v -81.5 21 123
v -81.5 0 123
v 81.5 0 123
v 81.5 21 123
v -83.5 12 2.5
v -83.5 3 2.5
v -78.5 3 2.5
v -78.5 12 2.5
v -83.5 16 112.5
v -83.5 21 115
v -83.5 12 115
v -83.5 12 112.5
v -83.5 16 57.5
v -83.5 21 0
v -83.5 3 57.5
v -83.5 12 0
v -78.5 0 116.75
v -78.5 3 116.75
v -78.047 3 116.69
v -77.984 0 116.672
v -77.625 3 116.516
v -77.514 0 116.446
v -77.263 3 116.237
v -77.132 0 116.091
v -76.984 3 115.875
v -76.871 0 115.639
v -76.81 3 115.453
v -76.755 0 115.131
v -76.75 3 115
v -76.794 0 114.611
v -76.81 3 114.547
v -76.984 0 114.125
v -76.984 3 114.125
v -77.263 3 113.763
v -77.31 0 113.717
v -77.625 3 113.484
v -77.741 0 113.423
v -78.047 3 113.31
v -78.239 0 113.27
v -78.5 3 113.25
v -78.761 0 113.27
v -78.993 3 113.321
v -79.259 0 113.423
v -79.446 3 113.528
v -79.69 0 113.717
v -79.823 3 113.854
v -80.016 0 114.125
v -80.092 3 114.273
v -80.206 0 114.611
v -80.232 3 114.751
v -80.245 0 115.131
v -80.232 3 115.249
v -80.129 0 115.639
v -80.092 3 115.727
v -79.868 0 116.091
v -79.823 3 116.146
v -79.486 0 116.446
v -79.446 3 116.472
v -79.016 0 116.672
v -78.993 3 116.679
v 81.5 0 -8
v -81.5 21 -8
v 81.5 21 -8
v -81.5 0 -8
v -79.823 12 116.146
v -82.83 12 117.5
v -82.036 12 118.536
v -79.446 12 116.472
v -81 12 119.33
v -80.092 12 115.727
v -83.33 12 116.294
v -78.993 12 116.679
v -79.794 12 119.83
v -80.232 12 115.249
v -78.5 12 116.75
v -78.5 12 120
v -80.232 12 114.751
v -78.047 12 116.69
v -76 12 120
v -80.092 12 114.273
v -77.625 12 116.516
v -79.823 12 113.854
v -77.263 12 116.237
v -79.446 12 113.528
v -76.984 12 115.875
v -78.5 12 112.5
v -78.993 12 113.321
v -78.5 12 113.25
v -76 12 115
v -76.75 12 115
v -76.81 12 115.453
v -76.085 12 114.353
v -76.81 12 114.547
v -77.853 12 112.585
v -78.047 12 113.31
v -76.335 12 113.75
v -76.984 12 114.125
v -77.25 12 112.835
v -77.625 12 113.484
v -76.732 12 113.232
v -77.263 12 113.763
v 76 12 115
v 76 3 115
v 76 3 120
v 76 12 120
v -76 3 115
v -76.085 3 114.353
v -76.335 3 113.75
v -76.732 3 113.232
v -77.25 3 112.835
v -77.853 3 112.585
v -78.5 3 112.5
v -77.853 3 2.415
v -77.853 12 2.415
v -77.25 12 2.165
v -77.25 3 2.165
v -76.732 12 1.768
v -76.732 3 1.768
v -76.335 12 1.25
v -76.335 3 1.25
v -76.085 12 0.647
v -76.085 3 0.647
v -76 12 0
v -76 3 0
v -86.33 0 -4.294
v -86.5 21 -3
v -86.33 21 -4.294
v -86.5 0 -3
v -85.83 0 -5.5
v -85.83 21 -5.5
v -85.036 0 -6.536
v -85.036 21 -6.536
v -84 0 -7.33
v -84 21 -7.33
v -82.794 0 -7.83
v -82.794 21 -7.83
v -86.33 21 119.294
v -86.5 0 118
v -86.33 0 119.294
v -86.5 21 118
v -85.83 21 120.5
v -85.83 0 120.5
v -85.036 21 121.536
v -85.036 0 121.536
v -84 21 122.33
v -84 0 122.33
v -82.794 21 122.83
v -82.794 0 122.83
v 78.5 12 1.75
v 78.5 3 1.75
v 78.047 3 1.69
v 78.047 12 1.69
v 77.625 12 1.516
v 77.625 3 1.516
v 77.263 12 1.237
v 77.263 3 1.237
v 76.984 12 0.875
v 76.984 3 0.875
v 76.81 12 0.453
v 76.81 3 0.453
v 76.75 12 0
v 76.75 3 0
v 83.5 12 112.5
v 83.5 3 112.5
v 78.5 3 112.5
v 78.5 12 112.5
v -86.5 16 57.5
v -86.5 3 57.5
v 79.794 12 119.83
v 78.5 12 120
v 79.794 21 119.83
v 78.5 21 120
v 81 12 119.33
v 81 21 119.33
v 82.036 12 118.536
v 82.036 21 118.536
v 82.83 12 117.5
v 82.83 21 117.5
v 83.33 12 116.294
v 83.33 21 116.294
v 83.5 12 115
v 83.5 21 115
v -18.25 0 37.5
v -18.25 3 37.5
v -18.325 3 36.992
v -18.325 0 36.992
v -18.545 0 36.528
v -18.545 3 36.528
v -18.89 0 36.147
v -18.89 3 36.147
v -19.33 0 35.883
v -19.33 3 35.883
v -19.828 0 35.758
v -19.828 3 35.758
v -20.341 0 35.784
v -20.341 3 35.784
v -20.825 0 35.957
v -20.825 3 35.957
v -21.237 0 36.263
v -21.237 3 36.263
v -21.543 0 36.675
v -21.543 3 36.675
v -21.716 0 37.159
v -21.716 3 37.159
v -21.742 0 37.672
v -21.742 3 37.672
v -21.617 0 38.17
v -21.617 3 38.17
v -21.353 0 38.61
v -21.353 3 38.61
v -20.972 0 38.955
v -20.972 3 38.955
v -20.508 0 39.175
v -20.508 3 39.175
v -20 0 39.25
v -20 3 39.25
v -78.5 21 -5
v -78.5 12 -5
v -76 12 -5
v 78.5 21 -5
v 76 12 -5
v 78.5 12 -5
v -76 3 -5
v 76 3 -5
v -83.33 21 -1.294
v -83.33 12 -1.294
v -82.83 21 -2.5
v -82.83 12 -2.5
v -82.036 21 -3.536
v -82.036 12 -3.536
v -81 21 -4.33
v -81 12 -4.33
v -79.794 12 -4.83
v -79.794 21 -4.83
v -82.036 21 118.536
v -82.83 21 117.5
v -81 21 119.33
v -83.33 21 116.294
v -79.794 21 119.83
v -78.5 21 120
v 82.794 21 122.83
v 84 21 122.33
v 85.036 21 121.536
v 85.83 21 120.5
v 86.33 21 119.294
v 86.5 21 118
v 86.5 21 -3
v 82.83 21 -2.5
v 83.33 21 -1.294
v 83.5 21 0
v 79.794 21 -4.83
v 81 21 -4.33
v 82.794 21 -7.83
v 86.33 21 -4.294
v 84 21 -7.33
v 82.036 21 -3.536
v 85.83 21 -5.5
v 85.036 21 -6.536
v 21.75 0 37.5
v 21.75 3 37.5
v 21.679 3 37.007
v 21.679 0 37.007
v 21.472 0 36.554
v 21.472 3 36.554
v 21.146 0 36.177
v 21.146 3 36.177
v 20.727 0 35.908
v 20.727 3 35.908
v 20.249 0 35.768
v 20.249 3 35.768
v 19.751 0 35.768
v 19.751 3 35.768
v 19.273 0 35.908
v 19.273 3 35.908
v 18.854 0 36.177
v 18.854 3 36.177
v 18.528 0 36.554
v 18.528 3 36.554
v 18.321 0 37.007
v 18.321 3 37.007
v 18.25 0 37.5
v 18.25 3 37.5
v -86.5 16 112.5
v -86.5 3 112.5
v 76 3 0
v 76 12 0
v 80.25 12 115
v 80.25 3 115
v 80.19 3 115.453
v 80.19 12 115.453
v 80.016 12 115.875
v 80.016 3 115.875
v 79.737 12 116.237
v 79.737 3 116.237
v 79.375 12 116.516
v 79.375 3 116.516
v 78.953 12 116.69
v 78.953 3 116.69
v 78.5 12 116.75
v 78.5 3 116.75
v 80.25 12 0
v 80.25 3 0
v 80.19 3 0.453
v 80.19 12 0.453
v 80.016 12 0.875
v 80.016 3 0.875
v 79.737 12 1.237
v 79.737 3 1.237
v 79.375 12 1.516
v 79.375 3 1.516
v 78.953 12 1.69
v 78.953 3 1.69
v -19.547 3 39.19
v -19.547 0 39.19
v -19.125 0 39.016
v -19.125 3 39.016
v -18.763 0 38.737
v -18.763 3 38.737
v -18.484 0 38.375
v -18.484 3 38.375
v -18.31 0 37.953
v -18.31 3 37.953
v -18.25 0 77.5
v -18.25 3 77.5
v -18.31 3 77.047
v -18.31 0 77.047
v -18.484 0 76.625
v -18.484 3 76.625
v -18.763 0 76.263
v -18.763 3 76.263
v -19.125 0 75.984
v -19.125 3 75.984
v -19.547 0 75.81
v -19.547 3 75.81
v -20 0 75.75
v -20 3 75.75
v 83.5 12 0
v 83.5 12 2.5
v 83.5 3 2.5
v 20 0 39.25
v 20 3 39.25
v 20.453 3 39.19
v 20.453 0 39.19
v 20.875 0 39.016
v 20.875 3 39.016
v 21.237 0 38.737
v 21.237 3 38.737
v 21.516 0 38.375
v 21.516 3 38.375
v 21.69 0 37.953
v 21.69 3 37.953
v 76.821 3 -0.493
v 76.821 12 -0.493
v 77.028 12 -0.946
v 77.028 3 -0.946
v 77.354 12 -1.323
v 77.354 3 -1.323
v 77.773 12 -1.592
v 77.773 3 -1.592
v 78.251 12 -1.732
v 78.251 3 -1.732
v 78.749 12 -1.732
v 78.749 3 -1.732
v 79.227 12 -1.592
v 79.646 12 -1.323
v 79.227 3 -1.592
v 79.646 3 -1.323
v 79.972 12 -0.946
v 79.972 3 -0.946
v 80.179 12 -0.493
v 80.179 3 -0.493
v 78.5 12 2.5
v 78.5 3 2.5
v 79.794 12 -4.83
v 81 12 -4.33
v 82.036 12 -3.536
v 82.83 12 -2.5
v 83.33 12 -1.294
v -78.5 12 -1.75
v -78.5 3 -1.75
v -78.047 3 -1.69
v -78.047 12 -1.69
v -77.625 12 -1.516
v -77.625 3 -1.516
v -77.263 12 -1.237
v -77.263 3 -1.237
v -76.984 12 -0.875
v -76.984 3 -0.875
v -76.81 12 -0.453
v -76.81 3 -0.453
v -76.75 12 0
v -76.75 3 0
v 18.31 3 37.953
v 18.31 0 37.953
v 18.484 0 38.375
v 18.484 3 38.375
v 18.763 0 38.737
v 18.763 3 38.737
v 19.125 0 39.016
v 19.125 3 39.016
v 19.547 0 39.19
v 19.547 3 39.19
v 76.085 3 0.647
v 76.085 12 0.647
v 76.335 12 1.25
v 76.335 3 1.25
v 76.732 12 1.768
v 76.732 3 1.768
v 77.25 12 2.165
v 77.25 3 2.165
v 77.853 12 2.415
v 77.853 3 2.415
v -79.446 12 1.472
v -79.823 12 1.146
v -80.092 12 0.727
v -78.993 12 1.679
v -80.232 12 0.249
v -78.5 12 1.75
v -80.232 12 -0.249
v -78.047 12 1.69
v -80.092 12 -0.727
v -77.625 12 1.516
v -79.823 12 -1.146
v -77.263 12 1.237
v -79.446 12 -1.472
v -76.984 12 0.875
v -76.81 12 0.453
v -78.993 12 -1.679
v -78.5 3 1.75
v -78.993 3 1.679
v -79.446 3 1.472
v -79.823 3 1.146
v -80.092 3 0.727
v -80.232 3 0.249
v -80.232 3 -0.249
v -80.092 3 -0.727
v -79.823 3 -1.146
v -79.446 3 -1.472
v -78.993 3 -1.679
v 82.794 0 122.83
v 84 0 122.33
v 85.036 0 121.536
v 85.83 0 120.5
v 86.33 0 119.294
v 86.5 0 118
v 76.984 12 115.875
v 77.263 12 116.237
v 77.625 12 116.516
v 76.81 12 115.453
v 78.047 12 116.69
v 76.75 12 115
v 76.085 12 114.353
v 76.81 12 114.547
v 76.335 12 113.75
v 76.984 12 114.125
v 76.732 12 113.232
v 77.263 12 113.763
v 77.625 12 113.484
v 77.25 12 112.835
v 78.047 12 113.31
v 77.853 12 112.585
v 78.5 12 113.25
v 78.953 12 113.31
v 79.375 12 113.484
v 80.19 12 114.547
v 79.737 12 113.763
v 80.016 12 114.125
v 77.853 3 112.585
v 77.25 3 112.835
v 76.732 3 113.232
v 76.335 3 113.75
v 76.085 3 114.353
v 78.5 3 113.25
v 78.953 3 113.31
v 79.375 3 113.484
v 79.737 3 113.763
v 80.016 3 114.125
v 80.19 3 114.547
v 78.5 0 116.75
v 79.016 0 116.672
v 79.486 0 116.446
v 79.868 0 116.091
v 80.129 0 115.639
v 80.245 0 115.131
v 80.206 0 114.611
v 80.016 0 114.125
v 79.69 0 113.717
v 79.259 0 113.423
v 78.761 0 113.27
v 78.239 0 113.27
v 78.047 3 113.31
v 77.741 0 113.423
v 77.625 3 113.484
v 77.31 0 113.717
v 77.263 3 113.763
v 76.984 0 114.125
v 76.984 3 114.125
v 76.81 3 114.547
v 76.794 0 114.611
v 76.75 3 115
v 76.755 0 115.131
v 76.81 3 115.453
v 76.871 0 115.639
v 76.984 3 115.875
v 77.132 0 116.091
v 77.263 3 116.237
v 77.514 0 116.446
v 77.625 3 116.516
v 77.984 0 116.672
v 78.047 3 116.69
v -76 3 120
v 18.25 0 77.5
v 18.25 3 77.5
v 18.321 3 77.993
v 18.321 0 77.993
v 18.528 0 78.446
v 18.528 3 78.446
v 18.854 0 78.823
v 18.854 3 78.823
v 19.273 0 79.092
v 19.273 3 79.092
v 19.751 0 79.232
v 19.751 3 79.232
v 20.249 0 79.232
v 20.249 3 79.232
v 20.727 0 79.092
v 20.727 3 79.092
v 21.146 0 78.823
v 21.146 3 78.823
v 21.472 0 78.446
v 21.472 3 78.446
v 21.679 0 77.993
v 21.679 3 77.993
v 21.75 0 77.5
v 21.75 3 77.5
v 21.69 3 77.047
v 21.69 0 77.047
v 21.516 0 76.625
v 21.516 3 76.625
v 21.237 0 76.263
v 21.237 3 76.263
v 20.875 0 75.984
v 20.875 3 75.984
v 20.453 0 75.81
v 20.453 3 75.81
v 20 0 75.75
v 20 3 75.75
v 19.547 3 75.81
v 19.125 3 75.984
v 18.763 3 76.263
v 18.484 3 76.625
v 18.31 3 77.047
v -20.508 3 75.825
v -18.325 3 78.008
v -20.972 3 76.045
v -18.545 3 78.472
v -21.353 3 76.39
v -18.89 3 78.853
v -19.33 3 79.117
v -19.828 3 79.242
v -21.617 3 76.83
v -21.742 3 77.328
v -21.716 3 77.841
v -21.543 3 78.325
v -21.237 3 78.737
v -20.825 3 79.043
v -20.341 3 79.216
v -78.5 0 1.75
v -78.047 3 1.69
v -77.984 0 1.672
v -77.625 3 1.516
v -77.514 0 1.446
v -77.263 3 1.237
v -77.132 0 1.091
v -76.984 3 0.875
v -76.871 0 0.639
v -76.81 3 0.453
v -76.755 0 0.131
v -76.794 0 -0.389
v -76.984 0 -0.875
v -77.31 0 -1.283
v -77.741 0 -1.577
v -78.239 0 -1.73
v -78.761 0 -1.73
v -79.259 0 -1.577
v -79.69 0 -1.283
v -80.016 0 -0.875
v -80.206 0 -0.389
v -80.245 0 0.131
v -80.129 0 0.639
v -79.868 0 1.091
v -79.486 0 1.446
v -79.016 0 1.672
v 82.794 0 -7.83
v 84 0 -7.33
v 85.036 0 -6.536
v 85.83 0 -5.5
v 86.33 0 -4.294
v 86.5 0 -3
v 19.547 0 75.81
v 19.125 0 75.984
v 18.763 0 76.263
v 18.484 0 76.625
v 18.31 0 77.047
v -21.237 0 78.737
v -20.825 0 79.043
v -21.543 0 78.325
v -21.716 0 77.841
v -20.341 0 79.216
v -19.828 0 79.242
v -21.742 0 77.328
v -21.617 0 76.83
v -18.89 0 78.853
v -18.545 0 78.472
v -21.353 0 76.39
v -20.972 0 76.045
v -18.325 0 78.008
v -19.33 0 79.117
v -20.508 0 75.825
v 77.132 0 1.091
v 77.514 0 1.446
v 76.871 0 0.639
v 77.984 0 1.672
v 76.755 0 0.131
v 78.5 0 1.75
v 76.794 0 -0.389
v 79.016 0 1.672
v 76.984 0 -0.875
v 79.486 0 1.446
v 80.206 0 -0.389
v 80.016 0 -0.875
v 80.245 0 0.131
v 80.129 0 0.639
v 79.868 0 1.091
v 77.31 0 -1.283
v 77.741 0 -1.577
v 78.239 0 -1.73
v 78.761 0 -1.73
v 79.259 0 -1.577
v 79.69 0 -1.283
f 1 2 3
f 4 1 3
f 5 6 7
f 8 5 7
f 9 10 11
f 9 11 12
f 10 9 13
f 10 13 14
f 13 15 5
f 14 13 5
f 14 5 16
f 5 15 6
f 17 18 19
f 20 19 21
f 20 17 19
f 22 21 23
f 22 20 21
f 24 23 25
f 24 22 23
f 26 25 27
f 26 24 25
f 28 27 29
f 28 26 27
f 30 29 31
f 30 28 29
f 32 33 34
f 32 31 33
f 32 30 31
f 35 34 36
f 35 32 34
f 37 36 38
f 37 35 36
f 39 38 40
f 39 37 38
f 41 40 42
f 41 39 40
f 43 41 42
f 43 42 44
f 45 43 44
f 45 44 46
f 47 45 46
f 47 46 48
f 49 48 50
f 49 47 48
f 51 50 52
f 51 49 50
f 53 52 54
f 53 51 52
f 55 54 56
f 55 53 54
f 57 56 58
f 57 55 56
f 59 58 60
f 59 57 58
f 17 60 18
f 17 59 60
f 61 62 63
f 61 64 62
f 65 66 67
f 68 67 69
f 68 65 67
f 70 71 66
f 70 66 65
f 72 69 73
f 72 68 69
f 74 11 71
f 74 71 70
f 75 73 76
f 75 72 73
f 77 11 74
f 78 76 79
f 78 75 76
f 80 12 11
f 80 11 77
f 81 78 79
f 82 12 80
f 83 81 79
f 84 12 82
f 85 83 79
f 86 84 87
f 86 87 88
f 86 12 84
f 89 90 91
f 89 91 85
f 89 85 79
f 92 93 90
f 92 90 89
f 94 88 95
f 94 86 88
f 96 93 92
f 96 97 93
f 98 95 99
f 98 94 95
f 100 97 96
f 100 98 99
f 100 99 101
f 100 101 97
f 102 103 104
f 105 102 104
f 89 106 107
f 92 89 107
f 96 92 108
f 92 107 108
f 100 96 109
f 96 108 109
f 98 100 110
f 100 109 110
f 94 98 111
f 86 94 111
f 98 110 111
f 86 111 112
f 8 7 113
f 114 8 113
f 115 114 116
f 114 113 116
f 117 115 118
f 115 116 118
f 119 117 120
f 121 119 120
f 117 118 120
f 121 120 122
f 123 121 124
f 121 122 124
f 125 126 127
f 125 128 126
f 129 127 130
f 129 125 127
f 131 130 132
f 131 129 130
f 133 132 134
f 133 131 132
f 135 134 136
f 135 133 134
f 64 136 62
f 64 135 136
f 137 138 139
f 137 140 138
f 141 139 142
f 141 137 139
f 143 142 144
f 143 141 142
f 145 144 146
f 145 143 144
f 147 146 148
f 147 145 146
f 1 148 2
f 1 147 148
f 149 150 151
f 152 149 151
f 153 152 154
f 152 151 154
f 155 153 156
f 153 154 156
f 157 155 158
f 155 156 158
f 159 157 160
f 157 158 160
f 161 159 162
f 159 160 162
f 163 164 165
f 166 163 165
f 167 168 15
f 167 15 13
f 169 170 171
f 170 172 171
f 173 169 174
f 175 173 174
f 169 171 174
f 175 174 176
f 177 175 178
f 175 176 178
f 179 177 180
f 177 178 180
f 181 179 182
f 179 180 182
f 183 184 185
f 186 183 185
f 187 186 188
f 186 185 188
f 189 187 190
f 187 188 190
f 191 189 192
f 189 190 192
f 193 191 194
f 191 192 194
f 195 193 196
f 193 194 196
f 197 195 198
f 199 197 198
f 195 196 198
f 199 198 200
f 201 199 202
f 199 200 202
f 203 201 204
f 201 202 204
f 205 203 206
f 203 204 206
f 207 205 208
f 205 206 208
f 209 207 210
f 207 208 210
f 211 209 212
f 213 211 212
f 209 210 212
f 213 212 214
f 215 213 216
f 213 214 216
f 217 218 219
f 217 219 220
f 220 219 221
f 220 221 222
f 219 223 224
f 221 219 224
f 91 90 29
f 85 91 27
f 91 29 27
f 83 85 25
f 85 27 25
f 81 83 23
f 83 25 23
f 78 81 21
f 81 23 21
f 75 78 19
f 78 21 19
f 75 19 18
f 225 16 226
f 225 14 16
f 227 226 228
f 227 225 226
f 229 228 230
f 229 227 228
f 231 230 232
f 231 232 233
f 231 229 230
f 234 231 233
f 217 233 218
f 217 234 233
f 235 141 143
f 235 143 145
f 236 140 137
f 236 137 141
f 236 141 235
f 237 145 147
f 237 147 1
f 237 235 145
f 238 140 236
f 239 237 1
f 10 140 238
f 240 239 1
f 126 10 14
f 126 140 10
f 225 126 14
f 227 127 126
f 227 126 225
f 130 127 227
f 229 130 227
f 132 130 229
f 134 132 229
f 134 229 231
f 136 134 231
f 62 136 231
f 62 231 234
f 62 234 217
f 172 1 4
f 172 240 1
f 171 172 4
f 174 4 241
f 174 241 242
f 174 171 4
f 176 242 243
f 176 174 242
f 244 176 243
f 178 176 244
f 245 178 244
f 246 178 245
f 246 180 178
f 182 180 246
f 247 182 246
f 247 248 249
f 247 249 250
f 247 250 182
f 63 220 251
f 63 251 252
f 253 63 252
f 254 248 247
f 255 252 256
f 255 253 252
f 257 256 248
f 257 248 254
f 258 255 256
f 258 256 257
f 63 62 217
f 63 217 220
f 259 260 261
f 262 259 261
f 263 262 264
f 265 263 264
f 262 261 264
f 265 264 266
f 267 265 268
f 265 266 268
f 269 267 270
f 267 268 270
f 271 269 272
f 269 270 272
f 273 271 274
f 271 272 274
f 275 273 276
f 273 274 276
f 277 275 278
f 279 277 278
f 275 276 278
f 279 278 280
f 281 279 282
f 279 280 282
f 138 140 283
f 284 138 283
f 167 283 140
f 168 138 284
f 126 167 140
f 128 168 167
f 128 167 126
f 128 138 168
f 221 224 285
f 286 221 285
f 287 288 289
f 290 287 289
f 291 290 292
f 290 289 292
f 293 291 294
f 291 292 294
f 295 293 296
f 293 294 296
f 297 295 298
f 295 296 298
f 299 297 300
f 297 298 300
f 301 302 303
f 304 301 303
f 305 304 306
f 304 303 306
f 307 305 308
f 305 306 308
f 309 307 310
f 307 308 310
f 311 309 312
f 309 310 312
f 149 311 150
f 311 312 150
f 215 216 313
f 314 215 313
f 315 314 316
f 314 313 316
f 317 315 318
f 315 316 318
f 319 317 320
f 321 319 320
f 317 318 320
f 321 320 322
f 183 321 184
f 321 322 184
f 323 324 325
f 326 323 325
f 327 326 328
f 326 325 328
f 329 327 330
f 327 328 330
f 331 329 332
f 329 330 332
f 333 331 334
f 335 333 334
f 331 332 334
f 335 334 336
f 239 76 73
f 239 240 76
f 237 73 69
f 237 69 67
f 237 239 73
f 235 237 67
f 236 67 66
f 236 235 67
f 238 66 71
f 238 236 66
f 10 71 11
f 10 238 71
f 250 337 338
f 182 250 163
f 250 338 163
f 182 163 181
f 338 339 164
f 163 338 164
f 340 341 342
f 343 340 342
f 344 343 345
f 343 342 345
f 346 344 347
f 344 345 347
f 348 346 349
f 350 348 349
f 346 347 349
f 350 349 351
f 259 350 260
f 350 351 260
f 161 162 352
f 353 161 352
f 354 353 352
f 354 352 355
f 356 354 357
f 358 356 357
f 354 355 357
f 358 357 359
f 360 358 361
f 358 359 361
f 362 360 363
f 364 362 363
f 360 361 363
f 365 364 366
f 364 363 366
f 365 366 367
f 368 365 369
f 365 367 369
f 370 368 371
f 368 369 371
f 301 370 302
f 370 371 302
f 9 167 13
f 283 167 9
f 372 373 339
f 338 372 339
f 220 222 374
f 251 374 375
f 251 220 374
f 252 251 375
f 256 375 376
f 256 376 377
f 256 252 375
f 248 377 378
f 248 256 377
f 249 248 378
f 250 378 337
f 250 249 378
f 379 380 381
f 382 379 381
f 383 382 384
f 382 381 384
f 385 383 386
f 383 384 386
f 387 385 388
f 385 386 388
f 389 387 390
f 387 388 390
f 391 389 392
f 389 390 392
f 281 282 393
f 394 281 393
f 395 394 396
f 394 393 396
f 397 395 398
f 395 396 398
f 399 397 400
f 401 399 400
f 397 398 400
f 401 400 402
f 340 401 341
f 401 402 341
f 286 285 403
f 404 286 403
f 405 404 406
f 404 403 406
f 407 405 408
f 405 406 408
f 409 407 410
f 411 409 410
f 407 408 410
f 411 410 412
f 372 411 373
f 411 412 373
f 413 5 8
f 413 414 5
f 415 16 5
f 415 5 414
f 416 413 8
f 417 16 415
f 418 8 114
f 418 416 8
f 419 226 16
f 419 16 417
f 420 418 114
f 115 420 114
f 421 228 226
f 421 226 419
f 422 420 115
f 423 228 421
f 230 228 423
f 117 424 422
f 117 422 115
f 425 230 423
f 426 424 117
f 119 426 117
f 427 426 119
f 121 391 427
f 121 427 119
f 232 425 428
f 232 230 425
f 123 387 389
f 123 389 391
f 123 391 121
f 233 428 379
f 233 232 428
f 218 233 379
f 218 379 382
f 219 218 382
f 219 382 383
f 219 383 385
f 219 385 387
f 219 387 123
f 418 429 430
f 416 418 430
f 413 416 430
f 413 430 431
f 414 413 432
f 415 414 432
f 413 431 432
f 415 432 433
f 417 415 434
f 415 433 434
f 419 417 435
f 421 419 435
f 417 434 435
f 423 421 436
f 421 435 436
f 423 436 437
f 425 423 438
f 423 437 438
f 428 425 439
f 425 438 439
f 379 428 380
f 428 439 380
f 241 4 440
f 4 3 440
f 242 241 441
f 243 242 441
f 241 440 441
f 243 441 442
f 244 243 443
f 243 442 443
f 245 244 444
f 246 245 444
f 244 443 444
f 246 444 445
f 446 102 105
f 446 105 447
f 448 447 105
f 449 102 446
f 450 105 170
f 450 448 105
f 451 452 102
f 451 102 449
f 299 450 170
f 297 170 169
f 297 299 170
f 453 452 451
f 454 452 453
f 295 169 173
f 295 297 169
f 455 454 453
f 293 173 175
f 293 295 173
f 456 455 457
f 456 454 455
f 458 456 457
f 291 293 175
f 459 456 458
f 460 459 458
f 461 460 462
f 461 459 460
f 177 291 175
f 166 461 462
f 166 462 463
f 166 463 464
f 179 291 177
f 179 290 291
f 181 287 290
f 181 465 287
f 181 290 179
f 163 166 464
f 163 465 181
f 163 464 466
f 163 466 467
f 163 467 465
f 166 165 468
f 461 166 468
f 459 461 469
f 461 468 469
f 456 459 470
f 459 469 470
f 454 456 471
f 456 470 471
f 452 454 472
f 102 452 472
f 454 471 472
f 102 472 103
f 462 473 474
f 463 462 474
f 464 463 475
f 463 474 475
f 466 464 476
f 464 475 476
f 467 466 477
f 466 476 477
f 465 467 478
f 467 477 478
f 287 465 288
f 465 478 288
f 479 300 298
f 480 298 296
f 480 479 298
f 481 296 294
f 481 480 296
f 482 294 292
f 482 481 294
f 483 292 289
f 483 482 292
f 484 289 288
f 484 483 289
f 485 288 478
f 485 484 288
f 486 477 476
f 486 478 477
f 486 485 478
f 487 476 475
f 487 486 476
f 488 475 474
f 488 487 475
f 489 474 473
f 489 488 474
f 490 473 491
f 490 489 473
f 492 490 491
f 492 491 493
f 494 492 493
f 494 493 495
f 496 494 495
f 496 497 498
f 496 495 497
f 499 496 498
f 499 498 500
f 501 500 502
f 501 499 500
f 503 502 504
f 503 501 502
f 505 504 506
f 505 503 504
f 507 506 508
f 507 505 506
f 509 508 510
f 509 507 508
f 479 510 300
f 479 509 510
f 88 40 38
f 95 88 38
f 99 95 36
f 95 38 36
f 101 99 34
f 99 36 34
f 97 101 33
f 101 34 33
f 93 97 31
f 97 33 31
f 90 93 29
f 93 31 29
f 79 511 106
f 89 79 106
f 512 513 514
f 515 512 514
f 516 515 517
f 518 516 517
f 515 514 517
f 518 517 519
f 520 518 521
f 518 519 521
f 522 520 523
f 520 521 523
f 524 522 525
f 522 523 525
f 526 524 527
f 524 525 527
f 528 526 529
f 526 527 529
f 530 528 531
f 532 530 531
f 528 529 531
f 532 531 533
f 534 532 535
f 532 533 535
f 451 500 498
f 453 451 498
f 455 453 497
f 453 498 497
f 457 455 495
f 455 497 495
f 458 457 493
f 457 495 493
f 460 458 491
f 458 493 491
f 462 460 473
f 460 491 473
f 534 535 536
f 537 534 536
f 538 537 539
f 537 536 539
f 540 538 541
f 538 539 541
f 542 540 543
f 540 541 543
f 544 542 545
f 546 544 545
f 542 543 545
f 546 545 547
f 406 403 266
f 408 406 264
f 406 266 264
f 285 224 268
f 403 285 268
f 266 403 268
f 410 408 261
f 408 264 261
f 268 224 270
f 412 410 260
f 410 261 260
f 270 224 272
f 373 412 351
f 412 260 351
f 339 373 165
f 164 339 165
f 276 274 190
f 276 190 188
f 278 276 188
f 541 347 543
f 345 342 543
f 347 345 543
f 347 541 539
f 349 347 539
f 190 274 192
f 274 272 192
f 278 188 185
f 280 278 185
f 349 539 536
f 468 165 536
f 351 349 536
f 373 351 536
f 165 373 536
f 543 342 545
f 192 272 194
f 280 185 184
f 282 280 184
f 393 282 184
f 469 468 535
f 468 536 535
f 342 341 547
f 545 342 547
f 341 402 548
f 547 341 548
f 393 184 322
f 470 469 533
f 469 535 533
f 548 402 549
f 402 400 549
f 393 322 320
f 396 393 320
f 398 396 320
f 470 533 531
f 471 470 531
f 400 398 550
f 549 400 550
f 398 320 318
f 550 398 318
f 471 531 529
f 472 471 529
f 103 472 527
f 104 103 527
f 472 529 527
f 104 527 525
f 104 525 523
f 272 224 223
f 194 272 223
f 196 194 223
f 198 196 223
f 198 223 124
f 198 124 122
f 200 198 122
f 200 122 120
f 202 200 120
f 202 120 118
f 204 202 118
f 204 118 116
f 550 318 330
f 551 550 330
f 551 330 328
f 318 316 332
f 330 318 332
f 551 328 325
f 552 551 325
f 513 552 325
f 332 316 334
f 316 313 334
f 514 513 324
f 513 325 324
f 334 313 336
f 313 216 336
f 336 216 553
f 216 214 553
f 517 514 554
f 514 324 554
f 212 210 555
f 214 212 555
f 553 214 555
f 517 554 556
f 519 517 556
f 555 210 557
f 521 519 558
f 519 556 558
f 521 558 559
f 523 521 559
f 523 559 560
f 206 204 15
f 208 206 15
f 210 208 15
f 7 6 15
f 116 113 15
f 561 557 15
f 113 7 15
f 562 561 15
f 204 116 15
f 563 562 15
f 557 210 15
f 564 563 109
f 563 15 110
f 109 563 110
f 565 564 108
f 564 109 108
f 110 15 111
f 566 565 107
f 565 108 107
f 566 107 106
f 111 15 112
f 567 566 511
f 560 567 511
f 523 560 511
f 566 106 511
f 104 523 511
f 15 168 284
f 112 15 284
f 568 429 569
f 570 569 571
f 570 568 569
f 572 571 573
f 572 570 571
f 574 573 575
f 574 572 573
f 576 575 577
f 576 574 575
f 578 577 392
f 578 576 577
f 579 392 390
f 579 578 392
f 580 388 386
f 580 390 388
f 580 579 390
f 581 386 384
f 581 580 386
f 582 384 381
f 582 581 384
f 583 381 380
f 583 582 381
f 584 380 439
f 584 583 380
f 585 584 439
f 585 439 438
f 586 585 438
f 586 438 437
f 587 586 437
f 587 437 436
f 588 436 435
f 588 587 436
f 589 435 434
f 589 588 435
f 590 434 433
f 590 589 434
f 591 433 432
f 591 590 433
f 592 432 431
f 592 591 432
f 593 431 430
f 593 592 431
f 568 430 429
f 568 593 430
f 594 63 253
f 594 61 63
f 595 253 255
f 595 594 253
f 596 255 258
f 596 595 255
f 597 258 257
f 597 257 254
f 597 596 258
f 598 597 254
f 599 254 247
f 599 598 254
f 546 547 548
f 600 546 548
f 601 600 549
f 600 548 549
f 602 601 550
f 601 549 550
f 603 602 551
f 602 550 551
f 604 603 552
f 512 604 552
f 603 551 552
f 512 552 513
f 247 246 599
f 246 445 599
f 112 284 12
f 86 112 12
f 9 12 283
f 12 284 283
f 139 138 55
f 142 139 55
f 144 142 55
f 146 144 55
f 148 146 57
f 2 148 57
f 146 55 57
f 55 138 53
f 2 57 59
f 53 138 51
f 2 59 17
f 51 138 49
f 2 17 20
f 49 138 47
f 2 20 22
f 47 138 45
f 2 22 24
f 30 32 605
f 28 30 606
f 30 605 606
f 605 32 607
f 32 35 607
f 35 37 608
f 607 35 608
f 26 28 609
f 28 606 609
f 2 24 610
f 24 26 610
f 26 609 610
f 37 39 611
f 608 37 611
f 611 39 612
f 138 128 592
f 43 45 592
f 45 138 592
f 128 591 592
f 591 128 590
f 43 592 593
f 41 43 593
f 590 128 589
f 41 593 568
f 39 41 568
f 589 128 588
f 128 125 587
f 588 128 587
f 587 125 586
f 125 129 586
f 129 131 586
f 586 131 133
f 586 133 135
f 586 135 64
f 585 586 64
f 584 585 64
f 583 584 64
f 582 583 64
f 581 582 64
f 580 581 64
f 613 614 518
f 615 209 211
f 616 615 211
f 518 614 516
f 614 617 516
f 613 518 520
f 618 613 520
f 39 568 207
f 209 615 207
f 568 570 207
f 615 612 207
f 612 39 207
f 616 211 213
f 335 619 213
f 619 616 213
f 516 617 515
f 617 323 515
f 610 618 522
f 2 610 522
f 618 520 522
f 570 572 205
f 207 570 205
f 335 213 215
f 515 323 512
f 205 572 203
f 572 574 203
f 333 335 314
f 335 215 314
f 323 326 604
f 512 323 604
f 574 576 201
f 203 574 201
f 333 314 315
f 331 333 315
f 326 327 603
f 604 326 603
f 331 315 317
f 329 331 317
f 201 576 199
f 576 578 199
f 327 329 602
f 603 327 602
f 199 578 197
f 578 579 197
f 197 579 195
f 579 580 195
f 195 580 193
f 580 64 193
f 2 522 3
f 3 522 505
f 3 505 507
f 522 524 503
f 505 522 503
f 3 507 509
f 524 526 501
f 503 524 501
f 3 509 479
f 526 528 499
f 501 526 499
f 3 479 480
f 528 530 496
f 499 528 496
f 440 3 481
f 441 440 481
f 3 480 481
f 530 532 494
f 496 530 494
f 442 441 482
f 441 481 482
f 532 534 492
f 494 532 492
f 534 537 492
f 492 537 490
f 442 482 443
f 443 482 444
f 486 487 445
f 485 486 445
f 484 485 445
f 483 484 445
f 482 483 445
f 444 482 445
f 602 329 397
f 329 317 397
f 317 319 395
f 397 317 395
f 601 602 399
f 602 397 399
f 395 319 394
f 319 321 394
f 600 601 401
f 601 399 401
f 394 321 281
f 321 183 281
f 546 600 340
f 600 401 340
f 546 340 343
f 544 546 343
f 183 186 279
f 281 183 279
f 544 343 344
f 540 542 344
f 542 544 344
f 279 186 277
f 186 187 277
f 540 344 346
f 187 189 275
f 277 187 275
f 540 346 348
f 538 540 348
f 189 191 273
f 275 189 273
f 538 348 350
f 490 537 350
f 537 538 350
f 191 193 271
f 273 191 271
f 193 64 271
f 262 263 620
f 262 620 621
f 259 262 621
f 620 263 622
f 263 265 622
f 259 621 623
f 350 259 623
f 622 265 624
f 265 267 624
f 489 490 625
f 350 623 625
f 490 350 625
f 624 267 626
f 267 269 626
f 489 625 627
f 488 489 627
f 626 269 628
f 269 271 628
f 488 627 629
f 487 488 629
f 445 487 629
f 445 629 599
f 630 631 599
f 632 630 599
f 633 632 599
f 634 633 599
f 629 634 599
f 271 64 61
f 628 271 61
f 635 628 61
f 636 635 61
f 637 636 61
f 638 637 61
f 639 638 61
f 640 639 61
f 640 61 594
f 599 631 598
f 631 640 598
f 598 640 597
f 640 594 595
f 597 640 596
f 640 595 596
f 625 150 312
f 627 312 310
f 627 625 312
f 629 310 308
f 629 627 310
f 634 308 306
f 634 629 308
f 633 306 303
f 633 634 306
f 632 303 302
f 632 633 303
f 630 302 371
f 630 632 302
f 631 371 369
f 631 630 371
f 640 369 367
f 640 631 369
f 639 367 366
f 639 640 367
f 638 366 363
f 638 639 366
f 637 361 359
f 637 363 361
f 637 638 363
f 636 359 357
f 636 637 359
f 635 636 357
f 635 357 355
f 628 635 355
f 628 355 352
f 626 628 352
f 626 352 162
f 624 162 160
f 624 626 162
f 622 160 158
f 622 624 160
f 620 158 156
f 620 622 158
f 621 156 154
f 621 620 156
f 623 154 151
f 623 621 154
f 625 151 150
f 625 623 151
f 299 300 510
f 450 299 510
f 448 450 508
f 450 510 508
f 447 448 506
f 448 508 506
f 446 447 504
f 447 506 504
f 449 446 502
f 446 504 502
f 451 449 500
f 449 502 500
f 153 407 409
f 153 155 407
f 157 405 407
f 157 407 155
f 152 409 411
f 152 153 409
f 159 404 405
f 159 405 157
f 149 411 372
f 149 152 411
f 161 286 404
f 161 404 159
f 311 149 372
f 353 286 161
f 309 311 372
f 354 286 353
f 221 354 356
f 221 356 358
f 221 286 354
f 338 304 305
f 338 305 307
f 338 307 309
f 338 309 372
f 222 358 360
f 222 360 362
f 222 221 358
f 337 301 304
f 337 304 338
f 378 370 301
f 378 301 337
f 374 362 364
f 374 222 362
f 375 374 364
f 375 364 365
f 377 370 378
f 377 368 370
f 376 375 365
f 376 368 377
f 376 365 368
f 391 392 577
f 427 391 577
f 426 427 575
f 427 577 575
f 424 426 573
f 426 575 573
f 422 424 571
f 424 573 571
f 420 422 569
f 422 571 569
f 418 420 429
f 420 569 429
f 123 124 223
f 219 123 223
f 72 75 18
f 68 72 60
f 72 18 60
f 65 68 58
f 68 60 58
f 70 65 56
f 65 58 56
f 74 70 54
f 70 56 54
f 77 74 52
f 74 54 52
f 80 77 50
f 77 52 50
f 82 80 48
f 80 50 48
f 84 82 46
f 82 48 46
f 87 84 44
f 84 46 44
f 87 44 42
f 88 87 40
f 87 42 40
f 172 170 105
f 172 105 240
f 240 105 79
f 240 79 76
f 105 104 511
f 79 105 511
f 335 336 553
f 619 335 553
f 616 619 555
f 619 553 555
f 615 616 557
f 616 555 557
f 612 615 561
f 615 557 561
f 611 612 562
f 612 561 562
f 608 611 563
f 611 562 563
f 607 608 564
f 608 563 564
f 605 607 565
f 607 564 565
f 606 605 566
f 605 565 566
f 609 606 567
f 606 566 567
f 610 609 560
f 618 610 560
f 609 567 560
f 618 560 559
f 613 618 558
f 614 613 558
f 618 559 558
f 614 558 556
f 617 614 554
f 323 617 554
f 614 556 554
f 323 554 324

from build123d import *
from build123d.topology import SkipClean

# Parameters (mm, degrees)
SKETCH_1_W          = 173
SKETCH_1_H          = 131
EXTRUDE_1_DEPTH     = 3
SKETCH_1_3_W        = 3
SKETCH_1_3_H        = 3
EXTRUDE_2_DEPTH     = 21
EXTRUDE_3_DEPTH     = 12
SKETCH_3_W          = 55
SKETCH_3_H          = 13
CUT_EXTRUDE_1_DEPTH = 4
CUT_EXTRUDE_START   = -14
SKETCH_4_R          = 1.75
CUT_EXTRUDE_2_DEPTH = 14
CUT_EXTRUDE_3_DEPTH = 4
FILLET_1_R          = 5
FILLET_2_R          = 5


with BuildPart() as part:
    # 草图1 → 凸台-拉伸1 (new body)
    with BuildSketch(Plane(origin=(0, 0, 0), x_dir=(1, 0, 0), z_dir=(0, 1, 0))):
        with Locations((0, -57.5)):
            Rectangle(SKETCH_1_W, SKETCH_1_H)
    extrude(amount=EXTRUDE_1_DEPTH)

    # 草图1<3> → 凸台-拉伸2 (add)
    # profile 1 of 2: a face of its own
    with BuildSketch(Plane(origin=(0, 0, 0), x_dir=(1, 0, 0), z_dir=(0, 1, 0))):
        Polygon((-86.5, -120), (-83.5, -120), (-83.5, -123), (83.5, -123), (86.5, -123), (86.5, 8), (-86.5, 8), align=None)
        Polygon((-76, 5), (76, 5), (78.5, 5), (83.5, 5), (83.5, -2.5), (83.5, -112.5), (83.5, -115), (83.5, -120), (76, -120), (-76, -120), (-83.5, -120), (-83.5, -112.5), (-83.5, -2.5), (-83.5, 5), (-78.5, 5), align=None, mode=Mode.SUBTRACT)
    # profile 2 of 2: a face of its own
    with BuildSketch(Plane(origin=(0, 0, 0), x_dir=(1, 0, 0), z_dir=(0, 1, 0))):
        with Locations((-85, -121.5)):
            Rectangle(SKETCH_1_3_W, SKETCH_1_3_H)
    extrude(amount=EXTRUDE_2_DEPTH)

    # 草图1<5> → 凸台-拉伸3 (add)
    with BuildSketch(Plane(origin=(0, 0, 0), x_dir=(1, 0, 0), z_dir=(0, 1, 0))):
        with BuildLine():
            ThreePointArc((81, -115), (80.267766953, -113.232233047), (78.5, -112.5))
            Line((78.5, -112.5), (78.5, -113.25))
            ThreePointArc((78.5, -113.25), (79.737436867, -113.762563133), (80.25, -115))
            ThreePointArc((80.25, -115), (78.5, -116.75), (76.75, -115))
            Line((76.75, -115), (76, -115))
            ThreePointArc((76, -115), (78.5, -117.5), (81, -115))
        make_face()
        with BuildLine():
            Line((78.5, -113.25), (78.5, -112.5))
            ThreePointArc((78.5, -112.5), (76.732233047, -113.232233047), (76, -115))
            Line((76, -115), (76.75, -115))
            ThreePointArc((76.75, -115), (77.262563133, -113.762563133), (78.5, -113.25))
        make_face()
        with BuildLine():
            ThreePointArc((-76, -115), (-76.732233047, -113.232233047), (-78.5, -112.5))
            Line((-78.5, -112.5), (-78.5, -113.25))
            ThreePointArc((-78.5, -113.25), (-77.262563133, -113.762563133), (-76.75, -115))
            Line((-76.75, -115), (-76, -115))
        make_face()
        with BuildLine():
            Line((-78.5, -113.25), (-78.5, -112.5))
            ThreePointArc((-78.5, -112.5), (-80.267766953, -116.767766953), (-76, -115))
            Line((-76, -115), (-76.75, -115))
            ThreePointArc((-76.75, -115), (-79.737436867, -116.237436867), (-78.5, -113.25))
        make_face()
        with BuildLine():
            Line((-76.75, 0), (-76, 0))
            ThreePointArc((-76, 0), (-76.732233047, 1.767766953), (-78.5, 2.5))
            Line((-78.5, 2.5), (-78.5, 1.75))
            ThreePointArc((-78.5, 1.75), (-77.262563133, 1.237436867), (-76.75, 0))
        make_face()
        with BuildLine():
            ThreePointArc((-78.5, 2.5), (-81, 0), (-78.5, -2.5))
            Line((-78.5, -2.5), (-78.5, -1.75))
            ThreePointArc((-78.5, -1.75), (-80.25, 0), (-78.5, 1.75))
            Line((-78.5, 1.75), (-78.5, 2.5))
        make_face()
        with BuildLine():
            ThreePointArc((-78.5, -2.5), (-76.732233047, -1.767766953), (-76, 0))
            Line((-76, 0), (-76.75, 0))
            ThreePointArc((-76.75, 0), (-77.262563133, -1.237436867), (-78.5, -1.75))
            Line((-78.5, -1.75), (-78.5, -2.5))
        make_face()
        with BuildLine():
            ThreePointArc((81, 0), (78.5, 2.5), (76, 0))
            Line((76, 0), (76.75, 0))
            ThreePointArc((76.75, 0), (78.5, 1.75), (80.25, 0))
            ThreePointArc((80.25, 0), (79.737436867, -1.237436867), (78.5, -1.75))
            Line((78.5, -1.75), (78.5, -2.5))
            ThreePointArc((78.5, -2.5), (80.267766953, -1.767766953), (81, 0))
        make_face()
        with BuildLine():
            Line((76.75, 0), (76, 0))
            ThreePointArc((76, 0), (76.732233047, -1.767766953), (78.5, -2.5))
            Line((78.5, -2.5), (78.5, -1.75))
            ThreePointArc((78.5, -1.75), (77.262563133, -1.237436867), (76.75, 0))
        make_face()
        with BuildLine():
            Line((-83.5, -2.5), (-78.5, -2.5))
            ThreePointArc((-78.5, -2.5), (-81, 0), (-78.5, 2.5))
            Line((-78.5, 2.5), (-78.5, 5))
            Line((-78.5, 5), (-83.5, 5))
            Line((-83.5, 5), (-83.5, -2.5))
        make_face()
        with BuildLine():
            ThreePointArc((-78.5, 2.5), (-76.732233047, 1.767766953), (-76, 0))
            Line((-76, 0), (-76, 5))
            Line((-76, 5), (-78.5, 5))
            Line((-78.5, 5), (-78.5, 2.5))
        make_face()
        with BuildLine():
            Line((76, 5), (76, 0))
            ThreePointArc((76, 0), (78.5, 2.5), (81, 0))
            ThreePointArc((81, 0), (80.267766953, -1.767766953), (78.5, -2.5))
            Line((78.5, -2.5), (83.5, -2.5))
            Line((83.5, -2.5), (83.5, 5))
            Line((83.5, 5), (78.5, 5))
            Line((78.5, 5), (76, 5))
        make_face()
        with BuildLine():
            Line((83.5, -112.5), (78.5, -112.5))
            ThreePointArc((78.5, -112.5), (80.267766953, -113.232233047), (81, -115))
            ThreePointArc((81, -115), (78.5, -117.5), (76, -115))
            Line((76, -115), (76, -120))
            Line((76, -120), (83.5, -120))
            Line((83.5, -120), (83.5, -115))
            Line((83.5, -115), (83.5, -112.5))
        make_face()
        with BuildLine():
            ThreePointArc((-76, -115), (-80.267766953, -116.767766953), (-78.5, -112.5))
            Line((-78.5, -112.5), (-83.5, -112.5))
            Line((-83.5, -112.5), (-83.5, -120))
            Line((-83.5, -120), (-76, -120))
            Line((-76, -120), (-76, -115))
        make_face()
    extrude(amount=EXTRUDE_3_DEPTH)

    # 草图3 → 切除-拉伸1 (cut)
    with BuildSketch(Plane.ZY.offset(86.5)):
        with Locations((85, 9.5)):
            Rectangle(SKETCH_3_W, SKETCH_3_H)
    extrude(amount=-CUT_EXTRUDE_1_DEPTH, mode=Mode.SUBTRACT)

    # 草图4 → 切除-拉伸2 (cut)
    with SkipClean():  # the faces are left unmerged after this step: merging them gives an invalid solid
        with BuildSketch(Plane(origin=(0, 12, 0), x_dir=(1, 0, 0), z_dir=(0, 1, 0)).offset(CUT_EXTRUDE_START)):
            with Locations(Location((-78.5, 0, 0), (0, 0, 270))):
                Circle(SKETCH_4_R)
            with Locations(Location((78.5, 0, 0), (0, 0, 270))):
                Circle(SKETCH_4_R)
            with Locations(Location((78.5, -115, 0), (0, 0, 270))):
                Circle(SKETCH_4_R)
            with Locations(Location((-78.5, -115, 0), (0, 0, 270))):
                Circle(SKETCH_4_R)
        extrude(amount=CUT_EXTRUDE_2_DEPTH, mode=Mode.SUBTRACT)

    # 草图5 → 切除-拉伸3 (cut)
    with SkipClean():  # the faces are left unmerged after this step: merging them gives an invalid solid
        with BuildSketch(Plane(origin=(0, 3, 0), x_dir=(1, 0, 0), z_dir=(0, 1, 0))):
            with BuildLine():
                ThreePointArc((18.25, -37.5), (18.762563133, -38.737436867), (20, -39.25))
                Line((20, -39.25), (20, -37.5))
                Line((20, -37.5), (18.25, -37.5))
            make_face()
            with BuildLine():
                Line((20, -37.5), (20, -39.25))
                ThreePointArc((20, -39.25), (21.237436867, -38.737436867), (21.75, -37.5))
                ThreePointArc((21.75, -37.5), (20, -35.75), (18.25, -37.5))
                Line((18.25, -37.5), (20, -37.5))
            make_face()
            with BuildLine():
                ThreePointArc((21.75, -77.5), (21.237436867, -76.262563133), (20, -75.75))
                Line((20, -75.75), (20, -77.5))
                Line((20, -77.5), (18.25, -77.5))
                ThreePointArc((18.25, -77.5), (20, -79.25), (21.75, -77.5))
            make_face()
            with BuildLine():
                Line((20, -77.5), (20, -75.75))
                ThreePointArc((20, -75.75), (18.762563133, -76.262563133), (18.25, -77.5))
                Line((18.25, -77.5), (20, -77.5))
            make_face()
            with BuildLine():
                ThreePointArc((-18.25, -77.5), (-18.762563133, -76.262563133), (-20, -75.75))
                Line((-20, -75.75), (-20, -77.5))
                Line((-20, -77.5), (-18.25, -77.5))
            make_face()
            with BuildLine():
                Line((-20, -77.5), (-20, -75.75))
                ThreePointArc((-20, -75.75), (-21.237436867, -78.737436867), (-18.25, -77.5))
                Line((-18.25, -77.5), (-20, -77.5))
            make_face()
            with BuildLine():
                ThreePointArc((-18.25, -37.5), (-21.237436867, -36.262563133), (-20, -39.25))
                Line((-20, -39.25), (-20, -37.5))
                Line((-20, -37.5), (-18.25, -37.5))
            make_face()
            with BuildLine():
                Line((-20, -37.5), (-20, -39.25))
                ThreePointArc((-20, -39.25), (-18.762563133, -38.737436867), (-18.25, -37.5))
                Line((-18.25, -37.5), (-20, -37.5))
            make_face()
        extrude(amount=-CUT_EXTRUDE_3_DEPTH, mode=Mode.SUBTRACT)

    # 圆角1
    fillet_1_edges = [part.edges().sort_by_distance(p)[0] for p in [
        (-86.5, 10.5, 123),
        (-86.5, 10.5, -8),
        (86.5, 10.5, -8),
        (86.5, 10.5, 123),
    ]]
    fillet(fillet_1_edges, radius=FILLET_1_R)

    # 圆角2
    fillet_2_edges = [part.edges().sort_by_distance(p)[0] for p in [
        (83.5, 16.5, 120),
        (-83.5, 16.5, 120),
        (-83.5, 16.5, -5),
        (83.5, 16.5, -5),
    ]]
    fillet(fillet_2_edges, radius=FILLET_2_R)


solid = part.part
